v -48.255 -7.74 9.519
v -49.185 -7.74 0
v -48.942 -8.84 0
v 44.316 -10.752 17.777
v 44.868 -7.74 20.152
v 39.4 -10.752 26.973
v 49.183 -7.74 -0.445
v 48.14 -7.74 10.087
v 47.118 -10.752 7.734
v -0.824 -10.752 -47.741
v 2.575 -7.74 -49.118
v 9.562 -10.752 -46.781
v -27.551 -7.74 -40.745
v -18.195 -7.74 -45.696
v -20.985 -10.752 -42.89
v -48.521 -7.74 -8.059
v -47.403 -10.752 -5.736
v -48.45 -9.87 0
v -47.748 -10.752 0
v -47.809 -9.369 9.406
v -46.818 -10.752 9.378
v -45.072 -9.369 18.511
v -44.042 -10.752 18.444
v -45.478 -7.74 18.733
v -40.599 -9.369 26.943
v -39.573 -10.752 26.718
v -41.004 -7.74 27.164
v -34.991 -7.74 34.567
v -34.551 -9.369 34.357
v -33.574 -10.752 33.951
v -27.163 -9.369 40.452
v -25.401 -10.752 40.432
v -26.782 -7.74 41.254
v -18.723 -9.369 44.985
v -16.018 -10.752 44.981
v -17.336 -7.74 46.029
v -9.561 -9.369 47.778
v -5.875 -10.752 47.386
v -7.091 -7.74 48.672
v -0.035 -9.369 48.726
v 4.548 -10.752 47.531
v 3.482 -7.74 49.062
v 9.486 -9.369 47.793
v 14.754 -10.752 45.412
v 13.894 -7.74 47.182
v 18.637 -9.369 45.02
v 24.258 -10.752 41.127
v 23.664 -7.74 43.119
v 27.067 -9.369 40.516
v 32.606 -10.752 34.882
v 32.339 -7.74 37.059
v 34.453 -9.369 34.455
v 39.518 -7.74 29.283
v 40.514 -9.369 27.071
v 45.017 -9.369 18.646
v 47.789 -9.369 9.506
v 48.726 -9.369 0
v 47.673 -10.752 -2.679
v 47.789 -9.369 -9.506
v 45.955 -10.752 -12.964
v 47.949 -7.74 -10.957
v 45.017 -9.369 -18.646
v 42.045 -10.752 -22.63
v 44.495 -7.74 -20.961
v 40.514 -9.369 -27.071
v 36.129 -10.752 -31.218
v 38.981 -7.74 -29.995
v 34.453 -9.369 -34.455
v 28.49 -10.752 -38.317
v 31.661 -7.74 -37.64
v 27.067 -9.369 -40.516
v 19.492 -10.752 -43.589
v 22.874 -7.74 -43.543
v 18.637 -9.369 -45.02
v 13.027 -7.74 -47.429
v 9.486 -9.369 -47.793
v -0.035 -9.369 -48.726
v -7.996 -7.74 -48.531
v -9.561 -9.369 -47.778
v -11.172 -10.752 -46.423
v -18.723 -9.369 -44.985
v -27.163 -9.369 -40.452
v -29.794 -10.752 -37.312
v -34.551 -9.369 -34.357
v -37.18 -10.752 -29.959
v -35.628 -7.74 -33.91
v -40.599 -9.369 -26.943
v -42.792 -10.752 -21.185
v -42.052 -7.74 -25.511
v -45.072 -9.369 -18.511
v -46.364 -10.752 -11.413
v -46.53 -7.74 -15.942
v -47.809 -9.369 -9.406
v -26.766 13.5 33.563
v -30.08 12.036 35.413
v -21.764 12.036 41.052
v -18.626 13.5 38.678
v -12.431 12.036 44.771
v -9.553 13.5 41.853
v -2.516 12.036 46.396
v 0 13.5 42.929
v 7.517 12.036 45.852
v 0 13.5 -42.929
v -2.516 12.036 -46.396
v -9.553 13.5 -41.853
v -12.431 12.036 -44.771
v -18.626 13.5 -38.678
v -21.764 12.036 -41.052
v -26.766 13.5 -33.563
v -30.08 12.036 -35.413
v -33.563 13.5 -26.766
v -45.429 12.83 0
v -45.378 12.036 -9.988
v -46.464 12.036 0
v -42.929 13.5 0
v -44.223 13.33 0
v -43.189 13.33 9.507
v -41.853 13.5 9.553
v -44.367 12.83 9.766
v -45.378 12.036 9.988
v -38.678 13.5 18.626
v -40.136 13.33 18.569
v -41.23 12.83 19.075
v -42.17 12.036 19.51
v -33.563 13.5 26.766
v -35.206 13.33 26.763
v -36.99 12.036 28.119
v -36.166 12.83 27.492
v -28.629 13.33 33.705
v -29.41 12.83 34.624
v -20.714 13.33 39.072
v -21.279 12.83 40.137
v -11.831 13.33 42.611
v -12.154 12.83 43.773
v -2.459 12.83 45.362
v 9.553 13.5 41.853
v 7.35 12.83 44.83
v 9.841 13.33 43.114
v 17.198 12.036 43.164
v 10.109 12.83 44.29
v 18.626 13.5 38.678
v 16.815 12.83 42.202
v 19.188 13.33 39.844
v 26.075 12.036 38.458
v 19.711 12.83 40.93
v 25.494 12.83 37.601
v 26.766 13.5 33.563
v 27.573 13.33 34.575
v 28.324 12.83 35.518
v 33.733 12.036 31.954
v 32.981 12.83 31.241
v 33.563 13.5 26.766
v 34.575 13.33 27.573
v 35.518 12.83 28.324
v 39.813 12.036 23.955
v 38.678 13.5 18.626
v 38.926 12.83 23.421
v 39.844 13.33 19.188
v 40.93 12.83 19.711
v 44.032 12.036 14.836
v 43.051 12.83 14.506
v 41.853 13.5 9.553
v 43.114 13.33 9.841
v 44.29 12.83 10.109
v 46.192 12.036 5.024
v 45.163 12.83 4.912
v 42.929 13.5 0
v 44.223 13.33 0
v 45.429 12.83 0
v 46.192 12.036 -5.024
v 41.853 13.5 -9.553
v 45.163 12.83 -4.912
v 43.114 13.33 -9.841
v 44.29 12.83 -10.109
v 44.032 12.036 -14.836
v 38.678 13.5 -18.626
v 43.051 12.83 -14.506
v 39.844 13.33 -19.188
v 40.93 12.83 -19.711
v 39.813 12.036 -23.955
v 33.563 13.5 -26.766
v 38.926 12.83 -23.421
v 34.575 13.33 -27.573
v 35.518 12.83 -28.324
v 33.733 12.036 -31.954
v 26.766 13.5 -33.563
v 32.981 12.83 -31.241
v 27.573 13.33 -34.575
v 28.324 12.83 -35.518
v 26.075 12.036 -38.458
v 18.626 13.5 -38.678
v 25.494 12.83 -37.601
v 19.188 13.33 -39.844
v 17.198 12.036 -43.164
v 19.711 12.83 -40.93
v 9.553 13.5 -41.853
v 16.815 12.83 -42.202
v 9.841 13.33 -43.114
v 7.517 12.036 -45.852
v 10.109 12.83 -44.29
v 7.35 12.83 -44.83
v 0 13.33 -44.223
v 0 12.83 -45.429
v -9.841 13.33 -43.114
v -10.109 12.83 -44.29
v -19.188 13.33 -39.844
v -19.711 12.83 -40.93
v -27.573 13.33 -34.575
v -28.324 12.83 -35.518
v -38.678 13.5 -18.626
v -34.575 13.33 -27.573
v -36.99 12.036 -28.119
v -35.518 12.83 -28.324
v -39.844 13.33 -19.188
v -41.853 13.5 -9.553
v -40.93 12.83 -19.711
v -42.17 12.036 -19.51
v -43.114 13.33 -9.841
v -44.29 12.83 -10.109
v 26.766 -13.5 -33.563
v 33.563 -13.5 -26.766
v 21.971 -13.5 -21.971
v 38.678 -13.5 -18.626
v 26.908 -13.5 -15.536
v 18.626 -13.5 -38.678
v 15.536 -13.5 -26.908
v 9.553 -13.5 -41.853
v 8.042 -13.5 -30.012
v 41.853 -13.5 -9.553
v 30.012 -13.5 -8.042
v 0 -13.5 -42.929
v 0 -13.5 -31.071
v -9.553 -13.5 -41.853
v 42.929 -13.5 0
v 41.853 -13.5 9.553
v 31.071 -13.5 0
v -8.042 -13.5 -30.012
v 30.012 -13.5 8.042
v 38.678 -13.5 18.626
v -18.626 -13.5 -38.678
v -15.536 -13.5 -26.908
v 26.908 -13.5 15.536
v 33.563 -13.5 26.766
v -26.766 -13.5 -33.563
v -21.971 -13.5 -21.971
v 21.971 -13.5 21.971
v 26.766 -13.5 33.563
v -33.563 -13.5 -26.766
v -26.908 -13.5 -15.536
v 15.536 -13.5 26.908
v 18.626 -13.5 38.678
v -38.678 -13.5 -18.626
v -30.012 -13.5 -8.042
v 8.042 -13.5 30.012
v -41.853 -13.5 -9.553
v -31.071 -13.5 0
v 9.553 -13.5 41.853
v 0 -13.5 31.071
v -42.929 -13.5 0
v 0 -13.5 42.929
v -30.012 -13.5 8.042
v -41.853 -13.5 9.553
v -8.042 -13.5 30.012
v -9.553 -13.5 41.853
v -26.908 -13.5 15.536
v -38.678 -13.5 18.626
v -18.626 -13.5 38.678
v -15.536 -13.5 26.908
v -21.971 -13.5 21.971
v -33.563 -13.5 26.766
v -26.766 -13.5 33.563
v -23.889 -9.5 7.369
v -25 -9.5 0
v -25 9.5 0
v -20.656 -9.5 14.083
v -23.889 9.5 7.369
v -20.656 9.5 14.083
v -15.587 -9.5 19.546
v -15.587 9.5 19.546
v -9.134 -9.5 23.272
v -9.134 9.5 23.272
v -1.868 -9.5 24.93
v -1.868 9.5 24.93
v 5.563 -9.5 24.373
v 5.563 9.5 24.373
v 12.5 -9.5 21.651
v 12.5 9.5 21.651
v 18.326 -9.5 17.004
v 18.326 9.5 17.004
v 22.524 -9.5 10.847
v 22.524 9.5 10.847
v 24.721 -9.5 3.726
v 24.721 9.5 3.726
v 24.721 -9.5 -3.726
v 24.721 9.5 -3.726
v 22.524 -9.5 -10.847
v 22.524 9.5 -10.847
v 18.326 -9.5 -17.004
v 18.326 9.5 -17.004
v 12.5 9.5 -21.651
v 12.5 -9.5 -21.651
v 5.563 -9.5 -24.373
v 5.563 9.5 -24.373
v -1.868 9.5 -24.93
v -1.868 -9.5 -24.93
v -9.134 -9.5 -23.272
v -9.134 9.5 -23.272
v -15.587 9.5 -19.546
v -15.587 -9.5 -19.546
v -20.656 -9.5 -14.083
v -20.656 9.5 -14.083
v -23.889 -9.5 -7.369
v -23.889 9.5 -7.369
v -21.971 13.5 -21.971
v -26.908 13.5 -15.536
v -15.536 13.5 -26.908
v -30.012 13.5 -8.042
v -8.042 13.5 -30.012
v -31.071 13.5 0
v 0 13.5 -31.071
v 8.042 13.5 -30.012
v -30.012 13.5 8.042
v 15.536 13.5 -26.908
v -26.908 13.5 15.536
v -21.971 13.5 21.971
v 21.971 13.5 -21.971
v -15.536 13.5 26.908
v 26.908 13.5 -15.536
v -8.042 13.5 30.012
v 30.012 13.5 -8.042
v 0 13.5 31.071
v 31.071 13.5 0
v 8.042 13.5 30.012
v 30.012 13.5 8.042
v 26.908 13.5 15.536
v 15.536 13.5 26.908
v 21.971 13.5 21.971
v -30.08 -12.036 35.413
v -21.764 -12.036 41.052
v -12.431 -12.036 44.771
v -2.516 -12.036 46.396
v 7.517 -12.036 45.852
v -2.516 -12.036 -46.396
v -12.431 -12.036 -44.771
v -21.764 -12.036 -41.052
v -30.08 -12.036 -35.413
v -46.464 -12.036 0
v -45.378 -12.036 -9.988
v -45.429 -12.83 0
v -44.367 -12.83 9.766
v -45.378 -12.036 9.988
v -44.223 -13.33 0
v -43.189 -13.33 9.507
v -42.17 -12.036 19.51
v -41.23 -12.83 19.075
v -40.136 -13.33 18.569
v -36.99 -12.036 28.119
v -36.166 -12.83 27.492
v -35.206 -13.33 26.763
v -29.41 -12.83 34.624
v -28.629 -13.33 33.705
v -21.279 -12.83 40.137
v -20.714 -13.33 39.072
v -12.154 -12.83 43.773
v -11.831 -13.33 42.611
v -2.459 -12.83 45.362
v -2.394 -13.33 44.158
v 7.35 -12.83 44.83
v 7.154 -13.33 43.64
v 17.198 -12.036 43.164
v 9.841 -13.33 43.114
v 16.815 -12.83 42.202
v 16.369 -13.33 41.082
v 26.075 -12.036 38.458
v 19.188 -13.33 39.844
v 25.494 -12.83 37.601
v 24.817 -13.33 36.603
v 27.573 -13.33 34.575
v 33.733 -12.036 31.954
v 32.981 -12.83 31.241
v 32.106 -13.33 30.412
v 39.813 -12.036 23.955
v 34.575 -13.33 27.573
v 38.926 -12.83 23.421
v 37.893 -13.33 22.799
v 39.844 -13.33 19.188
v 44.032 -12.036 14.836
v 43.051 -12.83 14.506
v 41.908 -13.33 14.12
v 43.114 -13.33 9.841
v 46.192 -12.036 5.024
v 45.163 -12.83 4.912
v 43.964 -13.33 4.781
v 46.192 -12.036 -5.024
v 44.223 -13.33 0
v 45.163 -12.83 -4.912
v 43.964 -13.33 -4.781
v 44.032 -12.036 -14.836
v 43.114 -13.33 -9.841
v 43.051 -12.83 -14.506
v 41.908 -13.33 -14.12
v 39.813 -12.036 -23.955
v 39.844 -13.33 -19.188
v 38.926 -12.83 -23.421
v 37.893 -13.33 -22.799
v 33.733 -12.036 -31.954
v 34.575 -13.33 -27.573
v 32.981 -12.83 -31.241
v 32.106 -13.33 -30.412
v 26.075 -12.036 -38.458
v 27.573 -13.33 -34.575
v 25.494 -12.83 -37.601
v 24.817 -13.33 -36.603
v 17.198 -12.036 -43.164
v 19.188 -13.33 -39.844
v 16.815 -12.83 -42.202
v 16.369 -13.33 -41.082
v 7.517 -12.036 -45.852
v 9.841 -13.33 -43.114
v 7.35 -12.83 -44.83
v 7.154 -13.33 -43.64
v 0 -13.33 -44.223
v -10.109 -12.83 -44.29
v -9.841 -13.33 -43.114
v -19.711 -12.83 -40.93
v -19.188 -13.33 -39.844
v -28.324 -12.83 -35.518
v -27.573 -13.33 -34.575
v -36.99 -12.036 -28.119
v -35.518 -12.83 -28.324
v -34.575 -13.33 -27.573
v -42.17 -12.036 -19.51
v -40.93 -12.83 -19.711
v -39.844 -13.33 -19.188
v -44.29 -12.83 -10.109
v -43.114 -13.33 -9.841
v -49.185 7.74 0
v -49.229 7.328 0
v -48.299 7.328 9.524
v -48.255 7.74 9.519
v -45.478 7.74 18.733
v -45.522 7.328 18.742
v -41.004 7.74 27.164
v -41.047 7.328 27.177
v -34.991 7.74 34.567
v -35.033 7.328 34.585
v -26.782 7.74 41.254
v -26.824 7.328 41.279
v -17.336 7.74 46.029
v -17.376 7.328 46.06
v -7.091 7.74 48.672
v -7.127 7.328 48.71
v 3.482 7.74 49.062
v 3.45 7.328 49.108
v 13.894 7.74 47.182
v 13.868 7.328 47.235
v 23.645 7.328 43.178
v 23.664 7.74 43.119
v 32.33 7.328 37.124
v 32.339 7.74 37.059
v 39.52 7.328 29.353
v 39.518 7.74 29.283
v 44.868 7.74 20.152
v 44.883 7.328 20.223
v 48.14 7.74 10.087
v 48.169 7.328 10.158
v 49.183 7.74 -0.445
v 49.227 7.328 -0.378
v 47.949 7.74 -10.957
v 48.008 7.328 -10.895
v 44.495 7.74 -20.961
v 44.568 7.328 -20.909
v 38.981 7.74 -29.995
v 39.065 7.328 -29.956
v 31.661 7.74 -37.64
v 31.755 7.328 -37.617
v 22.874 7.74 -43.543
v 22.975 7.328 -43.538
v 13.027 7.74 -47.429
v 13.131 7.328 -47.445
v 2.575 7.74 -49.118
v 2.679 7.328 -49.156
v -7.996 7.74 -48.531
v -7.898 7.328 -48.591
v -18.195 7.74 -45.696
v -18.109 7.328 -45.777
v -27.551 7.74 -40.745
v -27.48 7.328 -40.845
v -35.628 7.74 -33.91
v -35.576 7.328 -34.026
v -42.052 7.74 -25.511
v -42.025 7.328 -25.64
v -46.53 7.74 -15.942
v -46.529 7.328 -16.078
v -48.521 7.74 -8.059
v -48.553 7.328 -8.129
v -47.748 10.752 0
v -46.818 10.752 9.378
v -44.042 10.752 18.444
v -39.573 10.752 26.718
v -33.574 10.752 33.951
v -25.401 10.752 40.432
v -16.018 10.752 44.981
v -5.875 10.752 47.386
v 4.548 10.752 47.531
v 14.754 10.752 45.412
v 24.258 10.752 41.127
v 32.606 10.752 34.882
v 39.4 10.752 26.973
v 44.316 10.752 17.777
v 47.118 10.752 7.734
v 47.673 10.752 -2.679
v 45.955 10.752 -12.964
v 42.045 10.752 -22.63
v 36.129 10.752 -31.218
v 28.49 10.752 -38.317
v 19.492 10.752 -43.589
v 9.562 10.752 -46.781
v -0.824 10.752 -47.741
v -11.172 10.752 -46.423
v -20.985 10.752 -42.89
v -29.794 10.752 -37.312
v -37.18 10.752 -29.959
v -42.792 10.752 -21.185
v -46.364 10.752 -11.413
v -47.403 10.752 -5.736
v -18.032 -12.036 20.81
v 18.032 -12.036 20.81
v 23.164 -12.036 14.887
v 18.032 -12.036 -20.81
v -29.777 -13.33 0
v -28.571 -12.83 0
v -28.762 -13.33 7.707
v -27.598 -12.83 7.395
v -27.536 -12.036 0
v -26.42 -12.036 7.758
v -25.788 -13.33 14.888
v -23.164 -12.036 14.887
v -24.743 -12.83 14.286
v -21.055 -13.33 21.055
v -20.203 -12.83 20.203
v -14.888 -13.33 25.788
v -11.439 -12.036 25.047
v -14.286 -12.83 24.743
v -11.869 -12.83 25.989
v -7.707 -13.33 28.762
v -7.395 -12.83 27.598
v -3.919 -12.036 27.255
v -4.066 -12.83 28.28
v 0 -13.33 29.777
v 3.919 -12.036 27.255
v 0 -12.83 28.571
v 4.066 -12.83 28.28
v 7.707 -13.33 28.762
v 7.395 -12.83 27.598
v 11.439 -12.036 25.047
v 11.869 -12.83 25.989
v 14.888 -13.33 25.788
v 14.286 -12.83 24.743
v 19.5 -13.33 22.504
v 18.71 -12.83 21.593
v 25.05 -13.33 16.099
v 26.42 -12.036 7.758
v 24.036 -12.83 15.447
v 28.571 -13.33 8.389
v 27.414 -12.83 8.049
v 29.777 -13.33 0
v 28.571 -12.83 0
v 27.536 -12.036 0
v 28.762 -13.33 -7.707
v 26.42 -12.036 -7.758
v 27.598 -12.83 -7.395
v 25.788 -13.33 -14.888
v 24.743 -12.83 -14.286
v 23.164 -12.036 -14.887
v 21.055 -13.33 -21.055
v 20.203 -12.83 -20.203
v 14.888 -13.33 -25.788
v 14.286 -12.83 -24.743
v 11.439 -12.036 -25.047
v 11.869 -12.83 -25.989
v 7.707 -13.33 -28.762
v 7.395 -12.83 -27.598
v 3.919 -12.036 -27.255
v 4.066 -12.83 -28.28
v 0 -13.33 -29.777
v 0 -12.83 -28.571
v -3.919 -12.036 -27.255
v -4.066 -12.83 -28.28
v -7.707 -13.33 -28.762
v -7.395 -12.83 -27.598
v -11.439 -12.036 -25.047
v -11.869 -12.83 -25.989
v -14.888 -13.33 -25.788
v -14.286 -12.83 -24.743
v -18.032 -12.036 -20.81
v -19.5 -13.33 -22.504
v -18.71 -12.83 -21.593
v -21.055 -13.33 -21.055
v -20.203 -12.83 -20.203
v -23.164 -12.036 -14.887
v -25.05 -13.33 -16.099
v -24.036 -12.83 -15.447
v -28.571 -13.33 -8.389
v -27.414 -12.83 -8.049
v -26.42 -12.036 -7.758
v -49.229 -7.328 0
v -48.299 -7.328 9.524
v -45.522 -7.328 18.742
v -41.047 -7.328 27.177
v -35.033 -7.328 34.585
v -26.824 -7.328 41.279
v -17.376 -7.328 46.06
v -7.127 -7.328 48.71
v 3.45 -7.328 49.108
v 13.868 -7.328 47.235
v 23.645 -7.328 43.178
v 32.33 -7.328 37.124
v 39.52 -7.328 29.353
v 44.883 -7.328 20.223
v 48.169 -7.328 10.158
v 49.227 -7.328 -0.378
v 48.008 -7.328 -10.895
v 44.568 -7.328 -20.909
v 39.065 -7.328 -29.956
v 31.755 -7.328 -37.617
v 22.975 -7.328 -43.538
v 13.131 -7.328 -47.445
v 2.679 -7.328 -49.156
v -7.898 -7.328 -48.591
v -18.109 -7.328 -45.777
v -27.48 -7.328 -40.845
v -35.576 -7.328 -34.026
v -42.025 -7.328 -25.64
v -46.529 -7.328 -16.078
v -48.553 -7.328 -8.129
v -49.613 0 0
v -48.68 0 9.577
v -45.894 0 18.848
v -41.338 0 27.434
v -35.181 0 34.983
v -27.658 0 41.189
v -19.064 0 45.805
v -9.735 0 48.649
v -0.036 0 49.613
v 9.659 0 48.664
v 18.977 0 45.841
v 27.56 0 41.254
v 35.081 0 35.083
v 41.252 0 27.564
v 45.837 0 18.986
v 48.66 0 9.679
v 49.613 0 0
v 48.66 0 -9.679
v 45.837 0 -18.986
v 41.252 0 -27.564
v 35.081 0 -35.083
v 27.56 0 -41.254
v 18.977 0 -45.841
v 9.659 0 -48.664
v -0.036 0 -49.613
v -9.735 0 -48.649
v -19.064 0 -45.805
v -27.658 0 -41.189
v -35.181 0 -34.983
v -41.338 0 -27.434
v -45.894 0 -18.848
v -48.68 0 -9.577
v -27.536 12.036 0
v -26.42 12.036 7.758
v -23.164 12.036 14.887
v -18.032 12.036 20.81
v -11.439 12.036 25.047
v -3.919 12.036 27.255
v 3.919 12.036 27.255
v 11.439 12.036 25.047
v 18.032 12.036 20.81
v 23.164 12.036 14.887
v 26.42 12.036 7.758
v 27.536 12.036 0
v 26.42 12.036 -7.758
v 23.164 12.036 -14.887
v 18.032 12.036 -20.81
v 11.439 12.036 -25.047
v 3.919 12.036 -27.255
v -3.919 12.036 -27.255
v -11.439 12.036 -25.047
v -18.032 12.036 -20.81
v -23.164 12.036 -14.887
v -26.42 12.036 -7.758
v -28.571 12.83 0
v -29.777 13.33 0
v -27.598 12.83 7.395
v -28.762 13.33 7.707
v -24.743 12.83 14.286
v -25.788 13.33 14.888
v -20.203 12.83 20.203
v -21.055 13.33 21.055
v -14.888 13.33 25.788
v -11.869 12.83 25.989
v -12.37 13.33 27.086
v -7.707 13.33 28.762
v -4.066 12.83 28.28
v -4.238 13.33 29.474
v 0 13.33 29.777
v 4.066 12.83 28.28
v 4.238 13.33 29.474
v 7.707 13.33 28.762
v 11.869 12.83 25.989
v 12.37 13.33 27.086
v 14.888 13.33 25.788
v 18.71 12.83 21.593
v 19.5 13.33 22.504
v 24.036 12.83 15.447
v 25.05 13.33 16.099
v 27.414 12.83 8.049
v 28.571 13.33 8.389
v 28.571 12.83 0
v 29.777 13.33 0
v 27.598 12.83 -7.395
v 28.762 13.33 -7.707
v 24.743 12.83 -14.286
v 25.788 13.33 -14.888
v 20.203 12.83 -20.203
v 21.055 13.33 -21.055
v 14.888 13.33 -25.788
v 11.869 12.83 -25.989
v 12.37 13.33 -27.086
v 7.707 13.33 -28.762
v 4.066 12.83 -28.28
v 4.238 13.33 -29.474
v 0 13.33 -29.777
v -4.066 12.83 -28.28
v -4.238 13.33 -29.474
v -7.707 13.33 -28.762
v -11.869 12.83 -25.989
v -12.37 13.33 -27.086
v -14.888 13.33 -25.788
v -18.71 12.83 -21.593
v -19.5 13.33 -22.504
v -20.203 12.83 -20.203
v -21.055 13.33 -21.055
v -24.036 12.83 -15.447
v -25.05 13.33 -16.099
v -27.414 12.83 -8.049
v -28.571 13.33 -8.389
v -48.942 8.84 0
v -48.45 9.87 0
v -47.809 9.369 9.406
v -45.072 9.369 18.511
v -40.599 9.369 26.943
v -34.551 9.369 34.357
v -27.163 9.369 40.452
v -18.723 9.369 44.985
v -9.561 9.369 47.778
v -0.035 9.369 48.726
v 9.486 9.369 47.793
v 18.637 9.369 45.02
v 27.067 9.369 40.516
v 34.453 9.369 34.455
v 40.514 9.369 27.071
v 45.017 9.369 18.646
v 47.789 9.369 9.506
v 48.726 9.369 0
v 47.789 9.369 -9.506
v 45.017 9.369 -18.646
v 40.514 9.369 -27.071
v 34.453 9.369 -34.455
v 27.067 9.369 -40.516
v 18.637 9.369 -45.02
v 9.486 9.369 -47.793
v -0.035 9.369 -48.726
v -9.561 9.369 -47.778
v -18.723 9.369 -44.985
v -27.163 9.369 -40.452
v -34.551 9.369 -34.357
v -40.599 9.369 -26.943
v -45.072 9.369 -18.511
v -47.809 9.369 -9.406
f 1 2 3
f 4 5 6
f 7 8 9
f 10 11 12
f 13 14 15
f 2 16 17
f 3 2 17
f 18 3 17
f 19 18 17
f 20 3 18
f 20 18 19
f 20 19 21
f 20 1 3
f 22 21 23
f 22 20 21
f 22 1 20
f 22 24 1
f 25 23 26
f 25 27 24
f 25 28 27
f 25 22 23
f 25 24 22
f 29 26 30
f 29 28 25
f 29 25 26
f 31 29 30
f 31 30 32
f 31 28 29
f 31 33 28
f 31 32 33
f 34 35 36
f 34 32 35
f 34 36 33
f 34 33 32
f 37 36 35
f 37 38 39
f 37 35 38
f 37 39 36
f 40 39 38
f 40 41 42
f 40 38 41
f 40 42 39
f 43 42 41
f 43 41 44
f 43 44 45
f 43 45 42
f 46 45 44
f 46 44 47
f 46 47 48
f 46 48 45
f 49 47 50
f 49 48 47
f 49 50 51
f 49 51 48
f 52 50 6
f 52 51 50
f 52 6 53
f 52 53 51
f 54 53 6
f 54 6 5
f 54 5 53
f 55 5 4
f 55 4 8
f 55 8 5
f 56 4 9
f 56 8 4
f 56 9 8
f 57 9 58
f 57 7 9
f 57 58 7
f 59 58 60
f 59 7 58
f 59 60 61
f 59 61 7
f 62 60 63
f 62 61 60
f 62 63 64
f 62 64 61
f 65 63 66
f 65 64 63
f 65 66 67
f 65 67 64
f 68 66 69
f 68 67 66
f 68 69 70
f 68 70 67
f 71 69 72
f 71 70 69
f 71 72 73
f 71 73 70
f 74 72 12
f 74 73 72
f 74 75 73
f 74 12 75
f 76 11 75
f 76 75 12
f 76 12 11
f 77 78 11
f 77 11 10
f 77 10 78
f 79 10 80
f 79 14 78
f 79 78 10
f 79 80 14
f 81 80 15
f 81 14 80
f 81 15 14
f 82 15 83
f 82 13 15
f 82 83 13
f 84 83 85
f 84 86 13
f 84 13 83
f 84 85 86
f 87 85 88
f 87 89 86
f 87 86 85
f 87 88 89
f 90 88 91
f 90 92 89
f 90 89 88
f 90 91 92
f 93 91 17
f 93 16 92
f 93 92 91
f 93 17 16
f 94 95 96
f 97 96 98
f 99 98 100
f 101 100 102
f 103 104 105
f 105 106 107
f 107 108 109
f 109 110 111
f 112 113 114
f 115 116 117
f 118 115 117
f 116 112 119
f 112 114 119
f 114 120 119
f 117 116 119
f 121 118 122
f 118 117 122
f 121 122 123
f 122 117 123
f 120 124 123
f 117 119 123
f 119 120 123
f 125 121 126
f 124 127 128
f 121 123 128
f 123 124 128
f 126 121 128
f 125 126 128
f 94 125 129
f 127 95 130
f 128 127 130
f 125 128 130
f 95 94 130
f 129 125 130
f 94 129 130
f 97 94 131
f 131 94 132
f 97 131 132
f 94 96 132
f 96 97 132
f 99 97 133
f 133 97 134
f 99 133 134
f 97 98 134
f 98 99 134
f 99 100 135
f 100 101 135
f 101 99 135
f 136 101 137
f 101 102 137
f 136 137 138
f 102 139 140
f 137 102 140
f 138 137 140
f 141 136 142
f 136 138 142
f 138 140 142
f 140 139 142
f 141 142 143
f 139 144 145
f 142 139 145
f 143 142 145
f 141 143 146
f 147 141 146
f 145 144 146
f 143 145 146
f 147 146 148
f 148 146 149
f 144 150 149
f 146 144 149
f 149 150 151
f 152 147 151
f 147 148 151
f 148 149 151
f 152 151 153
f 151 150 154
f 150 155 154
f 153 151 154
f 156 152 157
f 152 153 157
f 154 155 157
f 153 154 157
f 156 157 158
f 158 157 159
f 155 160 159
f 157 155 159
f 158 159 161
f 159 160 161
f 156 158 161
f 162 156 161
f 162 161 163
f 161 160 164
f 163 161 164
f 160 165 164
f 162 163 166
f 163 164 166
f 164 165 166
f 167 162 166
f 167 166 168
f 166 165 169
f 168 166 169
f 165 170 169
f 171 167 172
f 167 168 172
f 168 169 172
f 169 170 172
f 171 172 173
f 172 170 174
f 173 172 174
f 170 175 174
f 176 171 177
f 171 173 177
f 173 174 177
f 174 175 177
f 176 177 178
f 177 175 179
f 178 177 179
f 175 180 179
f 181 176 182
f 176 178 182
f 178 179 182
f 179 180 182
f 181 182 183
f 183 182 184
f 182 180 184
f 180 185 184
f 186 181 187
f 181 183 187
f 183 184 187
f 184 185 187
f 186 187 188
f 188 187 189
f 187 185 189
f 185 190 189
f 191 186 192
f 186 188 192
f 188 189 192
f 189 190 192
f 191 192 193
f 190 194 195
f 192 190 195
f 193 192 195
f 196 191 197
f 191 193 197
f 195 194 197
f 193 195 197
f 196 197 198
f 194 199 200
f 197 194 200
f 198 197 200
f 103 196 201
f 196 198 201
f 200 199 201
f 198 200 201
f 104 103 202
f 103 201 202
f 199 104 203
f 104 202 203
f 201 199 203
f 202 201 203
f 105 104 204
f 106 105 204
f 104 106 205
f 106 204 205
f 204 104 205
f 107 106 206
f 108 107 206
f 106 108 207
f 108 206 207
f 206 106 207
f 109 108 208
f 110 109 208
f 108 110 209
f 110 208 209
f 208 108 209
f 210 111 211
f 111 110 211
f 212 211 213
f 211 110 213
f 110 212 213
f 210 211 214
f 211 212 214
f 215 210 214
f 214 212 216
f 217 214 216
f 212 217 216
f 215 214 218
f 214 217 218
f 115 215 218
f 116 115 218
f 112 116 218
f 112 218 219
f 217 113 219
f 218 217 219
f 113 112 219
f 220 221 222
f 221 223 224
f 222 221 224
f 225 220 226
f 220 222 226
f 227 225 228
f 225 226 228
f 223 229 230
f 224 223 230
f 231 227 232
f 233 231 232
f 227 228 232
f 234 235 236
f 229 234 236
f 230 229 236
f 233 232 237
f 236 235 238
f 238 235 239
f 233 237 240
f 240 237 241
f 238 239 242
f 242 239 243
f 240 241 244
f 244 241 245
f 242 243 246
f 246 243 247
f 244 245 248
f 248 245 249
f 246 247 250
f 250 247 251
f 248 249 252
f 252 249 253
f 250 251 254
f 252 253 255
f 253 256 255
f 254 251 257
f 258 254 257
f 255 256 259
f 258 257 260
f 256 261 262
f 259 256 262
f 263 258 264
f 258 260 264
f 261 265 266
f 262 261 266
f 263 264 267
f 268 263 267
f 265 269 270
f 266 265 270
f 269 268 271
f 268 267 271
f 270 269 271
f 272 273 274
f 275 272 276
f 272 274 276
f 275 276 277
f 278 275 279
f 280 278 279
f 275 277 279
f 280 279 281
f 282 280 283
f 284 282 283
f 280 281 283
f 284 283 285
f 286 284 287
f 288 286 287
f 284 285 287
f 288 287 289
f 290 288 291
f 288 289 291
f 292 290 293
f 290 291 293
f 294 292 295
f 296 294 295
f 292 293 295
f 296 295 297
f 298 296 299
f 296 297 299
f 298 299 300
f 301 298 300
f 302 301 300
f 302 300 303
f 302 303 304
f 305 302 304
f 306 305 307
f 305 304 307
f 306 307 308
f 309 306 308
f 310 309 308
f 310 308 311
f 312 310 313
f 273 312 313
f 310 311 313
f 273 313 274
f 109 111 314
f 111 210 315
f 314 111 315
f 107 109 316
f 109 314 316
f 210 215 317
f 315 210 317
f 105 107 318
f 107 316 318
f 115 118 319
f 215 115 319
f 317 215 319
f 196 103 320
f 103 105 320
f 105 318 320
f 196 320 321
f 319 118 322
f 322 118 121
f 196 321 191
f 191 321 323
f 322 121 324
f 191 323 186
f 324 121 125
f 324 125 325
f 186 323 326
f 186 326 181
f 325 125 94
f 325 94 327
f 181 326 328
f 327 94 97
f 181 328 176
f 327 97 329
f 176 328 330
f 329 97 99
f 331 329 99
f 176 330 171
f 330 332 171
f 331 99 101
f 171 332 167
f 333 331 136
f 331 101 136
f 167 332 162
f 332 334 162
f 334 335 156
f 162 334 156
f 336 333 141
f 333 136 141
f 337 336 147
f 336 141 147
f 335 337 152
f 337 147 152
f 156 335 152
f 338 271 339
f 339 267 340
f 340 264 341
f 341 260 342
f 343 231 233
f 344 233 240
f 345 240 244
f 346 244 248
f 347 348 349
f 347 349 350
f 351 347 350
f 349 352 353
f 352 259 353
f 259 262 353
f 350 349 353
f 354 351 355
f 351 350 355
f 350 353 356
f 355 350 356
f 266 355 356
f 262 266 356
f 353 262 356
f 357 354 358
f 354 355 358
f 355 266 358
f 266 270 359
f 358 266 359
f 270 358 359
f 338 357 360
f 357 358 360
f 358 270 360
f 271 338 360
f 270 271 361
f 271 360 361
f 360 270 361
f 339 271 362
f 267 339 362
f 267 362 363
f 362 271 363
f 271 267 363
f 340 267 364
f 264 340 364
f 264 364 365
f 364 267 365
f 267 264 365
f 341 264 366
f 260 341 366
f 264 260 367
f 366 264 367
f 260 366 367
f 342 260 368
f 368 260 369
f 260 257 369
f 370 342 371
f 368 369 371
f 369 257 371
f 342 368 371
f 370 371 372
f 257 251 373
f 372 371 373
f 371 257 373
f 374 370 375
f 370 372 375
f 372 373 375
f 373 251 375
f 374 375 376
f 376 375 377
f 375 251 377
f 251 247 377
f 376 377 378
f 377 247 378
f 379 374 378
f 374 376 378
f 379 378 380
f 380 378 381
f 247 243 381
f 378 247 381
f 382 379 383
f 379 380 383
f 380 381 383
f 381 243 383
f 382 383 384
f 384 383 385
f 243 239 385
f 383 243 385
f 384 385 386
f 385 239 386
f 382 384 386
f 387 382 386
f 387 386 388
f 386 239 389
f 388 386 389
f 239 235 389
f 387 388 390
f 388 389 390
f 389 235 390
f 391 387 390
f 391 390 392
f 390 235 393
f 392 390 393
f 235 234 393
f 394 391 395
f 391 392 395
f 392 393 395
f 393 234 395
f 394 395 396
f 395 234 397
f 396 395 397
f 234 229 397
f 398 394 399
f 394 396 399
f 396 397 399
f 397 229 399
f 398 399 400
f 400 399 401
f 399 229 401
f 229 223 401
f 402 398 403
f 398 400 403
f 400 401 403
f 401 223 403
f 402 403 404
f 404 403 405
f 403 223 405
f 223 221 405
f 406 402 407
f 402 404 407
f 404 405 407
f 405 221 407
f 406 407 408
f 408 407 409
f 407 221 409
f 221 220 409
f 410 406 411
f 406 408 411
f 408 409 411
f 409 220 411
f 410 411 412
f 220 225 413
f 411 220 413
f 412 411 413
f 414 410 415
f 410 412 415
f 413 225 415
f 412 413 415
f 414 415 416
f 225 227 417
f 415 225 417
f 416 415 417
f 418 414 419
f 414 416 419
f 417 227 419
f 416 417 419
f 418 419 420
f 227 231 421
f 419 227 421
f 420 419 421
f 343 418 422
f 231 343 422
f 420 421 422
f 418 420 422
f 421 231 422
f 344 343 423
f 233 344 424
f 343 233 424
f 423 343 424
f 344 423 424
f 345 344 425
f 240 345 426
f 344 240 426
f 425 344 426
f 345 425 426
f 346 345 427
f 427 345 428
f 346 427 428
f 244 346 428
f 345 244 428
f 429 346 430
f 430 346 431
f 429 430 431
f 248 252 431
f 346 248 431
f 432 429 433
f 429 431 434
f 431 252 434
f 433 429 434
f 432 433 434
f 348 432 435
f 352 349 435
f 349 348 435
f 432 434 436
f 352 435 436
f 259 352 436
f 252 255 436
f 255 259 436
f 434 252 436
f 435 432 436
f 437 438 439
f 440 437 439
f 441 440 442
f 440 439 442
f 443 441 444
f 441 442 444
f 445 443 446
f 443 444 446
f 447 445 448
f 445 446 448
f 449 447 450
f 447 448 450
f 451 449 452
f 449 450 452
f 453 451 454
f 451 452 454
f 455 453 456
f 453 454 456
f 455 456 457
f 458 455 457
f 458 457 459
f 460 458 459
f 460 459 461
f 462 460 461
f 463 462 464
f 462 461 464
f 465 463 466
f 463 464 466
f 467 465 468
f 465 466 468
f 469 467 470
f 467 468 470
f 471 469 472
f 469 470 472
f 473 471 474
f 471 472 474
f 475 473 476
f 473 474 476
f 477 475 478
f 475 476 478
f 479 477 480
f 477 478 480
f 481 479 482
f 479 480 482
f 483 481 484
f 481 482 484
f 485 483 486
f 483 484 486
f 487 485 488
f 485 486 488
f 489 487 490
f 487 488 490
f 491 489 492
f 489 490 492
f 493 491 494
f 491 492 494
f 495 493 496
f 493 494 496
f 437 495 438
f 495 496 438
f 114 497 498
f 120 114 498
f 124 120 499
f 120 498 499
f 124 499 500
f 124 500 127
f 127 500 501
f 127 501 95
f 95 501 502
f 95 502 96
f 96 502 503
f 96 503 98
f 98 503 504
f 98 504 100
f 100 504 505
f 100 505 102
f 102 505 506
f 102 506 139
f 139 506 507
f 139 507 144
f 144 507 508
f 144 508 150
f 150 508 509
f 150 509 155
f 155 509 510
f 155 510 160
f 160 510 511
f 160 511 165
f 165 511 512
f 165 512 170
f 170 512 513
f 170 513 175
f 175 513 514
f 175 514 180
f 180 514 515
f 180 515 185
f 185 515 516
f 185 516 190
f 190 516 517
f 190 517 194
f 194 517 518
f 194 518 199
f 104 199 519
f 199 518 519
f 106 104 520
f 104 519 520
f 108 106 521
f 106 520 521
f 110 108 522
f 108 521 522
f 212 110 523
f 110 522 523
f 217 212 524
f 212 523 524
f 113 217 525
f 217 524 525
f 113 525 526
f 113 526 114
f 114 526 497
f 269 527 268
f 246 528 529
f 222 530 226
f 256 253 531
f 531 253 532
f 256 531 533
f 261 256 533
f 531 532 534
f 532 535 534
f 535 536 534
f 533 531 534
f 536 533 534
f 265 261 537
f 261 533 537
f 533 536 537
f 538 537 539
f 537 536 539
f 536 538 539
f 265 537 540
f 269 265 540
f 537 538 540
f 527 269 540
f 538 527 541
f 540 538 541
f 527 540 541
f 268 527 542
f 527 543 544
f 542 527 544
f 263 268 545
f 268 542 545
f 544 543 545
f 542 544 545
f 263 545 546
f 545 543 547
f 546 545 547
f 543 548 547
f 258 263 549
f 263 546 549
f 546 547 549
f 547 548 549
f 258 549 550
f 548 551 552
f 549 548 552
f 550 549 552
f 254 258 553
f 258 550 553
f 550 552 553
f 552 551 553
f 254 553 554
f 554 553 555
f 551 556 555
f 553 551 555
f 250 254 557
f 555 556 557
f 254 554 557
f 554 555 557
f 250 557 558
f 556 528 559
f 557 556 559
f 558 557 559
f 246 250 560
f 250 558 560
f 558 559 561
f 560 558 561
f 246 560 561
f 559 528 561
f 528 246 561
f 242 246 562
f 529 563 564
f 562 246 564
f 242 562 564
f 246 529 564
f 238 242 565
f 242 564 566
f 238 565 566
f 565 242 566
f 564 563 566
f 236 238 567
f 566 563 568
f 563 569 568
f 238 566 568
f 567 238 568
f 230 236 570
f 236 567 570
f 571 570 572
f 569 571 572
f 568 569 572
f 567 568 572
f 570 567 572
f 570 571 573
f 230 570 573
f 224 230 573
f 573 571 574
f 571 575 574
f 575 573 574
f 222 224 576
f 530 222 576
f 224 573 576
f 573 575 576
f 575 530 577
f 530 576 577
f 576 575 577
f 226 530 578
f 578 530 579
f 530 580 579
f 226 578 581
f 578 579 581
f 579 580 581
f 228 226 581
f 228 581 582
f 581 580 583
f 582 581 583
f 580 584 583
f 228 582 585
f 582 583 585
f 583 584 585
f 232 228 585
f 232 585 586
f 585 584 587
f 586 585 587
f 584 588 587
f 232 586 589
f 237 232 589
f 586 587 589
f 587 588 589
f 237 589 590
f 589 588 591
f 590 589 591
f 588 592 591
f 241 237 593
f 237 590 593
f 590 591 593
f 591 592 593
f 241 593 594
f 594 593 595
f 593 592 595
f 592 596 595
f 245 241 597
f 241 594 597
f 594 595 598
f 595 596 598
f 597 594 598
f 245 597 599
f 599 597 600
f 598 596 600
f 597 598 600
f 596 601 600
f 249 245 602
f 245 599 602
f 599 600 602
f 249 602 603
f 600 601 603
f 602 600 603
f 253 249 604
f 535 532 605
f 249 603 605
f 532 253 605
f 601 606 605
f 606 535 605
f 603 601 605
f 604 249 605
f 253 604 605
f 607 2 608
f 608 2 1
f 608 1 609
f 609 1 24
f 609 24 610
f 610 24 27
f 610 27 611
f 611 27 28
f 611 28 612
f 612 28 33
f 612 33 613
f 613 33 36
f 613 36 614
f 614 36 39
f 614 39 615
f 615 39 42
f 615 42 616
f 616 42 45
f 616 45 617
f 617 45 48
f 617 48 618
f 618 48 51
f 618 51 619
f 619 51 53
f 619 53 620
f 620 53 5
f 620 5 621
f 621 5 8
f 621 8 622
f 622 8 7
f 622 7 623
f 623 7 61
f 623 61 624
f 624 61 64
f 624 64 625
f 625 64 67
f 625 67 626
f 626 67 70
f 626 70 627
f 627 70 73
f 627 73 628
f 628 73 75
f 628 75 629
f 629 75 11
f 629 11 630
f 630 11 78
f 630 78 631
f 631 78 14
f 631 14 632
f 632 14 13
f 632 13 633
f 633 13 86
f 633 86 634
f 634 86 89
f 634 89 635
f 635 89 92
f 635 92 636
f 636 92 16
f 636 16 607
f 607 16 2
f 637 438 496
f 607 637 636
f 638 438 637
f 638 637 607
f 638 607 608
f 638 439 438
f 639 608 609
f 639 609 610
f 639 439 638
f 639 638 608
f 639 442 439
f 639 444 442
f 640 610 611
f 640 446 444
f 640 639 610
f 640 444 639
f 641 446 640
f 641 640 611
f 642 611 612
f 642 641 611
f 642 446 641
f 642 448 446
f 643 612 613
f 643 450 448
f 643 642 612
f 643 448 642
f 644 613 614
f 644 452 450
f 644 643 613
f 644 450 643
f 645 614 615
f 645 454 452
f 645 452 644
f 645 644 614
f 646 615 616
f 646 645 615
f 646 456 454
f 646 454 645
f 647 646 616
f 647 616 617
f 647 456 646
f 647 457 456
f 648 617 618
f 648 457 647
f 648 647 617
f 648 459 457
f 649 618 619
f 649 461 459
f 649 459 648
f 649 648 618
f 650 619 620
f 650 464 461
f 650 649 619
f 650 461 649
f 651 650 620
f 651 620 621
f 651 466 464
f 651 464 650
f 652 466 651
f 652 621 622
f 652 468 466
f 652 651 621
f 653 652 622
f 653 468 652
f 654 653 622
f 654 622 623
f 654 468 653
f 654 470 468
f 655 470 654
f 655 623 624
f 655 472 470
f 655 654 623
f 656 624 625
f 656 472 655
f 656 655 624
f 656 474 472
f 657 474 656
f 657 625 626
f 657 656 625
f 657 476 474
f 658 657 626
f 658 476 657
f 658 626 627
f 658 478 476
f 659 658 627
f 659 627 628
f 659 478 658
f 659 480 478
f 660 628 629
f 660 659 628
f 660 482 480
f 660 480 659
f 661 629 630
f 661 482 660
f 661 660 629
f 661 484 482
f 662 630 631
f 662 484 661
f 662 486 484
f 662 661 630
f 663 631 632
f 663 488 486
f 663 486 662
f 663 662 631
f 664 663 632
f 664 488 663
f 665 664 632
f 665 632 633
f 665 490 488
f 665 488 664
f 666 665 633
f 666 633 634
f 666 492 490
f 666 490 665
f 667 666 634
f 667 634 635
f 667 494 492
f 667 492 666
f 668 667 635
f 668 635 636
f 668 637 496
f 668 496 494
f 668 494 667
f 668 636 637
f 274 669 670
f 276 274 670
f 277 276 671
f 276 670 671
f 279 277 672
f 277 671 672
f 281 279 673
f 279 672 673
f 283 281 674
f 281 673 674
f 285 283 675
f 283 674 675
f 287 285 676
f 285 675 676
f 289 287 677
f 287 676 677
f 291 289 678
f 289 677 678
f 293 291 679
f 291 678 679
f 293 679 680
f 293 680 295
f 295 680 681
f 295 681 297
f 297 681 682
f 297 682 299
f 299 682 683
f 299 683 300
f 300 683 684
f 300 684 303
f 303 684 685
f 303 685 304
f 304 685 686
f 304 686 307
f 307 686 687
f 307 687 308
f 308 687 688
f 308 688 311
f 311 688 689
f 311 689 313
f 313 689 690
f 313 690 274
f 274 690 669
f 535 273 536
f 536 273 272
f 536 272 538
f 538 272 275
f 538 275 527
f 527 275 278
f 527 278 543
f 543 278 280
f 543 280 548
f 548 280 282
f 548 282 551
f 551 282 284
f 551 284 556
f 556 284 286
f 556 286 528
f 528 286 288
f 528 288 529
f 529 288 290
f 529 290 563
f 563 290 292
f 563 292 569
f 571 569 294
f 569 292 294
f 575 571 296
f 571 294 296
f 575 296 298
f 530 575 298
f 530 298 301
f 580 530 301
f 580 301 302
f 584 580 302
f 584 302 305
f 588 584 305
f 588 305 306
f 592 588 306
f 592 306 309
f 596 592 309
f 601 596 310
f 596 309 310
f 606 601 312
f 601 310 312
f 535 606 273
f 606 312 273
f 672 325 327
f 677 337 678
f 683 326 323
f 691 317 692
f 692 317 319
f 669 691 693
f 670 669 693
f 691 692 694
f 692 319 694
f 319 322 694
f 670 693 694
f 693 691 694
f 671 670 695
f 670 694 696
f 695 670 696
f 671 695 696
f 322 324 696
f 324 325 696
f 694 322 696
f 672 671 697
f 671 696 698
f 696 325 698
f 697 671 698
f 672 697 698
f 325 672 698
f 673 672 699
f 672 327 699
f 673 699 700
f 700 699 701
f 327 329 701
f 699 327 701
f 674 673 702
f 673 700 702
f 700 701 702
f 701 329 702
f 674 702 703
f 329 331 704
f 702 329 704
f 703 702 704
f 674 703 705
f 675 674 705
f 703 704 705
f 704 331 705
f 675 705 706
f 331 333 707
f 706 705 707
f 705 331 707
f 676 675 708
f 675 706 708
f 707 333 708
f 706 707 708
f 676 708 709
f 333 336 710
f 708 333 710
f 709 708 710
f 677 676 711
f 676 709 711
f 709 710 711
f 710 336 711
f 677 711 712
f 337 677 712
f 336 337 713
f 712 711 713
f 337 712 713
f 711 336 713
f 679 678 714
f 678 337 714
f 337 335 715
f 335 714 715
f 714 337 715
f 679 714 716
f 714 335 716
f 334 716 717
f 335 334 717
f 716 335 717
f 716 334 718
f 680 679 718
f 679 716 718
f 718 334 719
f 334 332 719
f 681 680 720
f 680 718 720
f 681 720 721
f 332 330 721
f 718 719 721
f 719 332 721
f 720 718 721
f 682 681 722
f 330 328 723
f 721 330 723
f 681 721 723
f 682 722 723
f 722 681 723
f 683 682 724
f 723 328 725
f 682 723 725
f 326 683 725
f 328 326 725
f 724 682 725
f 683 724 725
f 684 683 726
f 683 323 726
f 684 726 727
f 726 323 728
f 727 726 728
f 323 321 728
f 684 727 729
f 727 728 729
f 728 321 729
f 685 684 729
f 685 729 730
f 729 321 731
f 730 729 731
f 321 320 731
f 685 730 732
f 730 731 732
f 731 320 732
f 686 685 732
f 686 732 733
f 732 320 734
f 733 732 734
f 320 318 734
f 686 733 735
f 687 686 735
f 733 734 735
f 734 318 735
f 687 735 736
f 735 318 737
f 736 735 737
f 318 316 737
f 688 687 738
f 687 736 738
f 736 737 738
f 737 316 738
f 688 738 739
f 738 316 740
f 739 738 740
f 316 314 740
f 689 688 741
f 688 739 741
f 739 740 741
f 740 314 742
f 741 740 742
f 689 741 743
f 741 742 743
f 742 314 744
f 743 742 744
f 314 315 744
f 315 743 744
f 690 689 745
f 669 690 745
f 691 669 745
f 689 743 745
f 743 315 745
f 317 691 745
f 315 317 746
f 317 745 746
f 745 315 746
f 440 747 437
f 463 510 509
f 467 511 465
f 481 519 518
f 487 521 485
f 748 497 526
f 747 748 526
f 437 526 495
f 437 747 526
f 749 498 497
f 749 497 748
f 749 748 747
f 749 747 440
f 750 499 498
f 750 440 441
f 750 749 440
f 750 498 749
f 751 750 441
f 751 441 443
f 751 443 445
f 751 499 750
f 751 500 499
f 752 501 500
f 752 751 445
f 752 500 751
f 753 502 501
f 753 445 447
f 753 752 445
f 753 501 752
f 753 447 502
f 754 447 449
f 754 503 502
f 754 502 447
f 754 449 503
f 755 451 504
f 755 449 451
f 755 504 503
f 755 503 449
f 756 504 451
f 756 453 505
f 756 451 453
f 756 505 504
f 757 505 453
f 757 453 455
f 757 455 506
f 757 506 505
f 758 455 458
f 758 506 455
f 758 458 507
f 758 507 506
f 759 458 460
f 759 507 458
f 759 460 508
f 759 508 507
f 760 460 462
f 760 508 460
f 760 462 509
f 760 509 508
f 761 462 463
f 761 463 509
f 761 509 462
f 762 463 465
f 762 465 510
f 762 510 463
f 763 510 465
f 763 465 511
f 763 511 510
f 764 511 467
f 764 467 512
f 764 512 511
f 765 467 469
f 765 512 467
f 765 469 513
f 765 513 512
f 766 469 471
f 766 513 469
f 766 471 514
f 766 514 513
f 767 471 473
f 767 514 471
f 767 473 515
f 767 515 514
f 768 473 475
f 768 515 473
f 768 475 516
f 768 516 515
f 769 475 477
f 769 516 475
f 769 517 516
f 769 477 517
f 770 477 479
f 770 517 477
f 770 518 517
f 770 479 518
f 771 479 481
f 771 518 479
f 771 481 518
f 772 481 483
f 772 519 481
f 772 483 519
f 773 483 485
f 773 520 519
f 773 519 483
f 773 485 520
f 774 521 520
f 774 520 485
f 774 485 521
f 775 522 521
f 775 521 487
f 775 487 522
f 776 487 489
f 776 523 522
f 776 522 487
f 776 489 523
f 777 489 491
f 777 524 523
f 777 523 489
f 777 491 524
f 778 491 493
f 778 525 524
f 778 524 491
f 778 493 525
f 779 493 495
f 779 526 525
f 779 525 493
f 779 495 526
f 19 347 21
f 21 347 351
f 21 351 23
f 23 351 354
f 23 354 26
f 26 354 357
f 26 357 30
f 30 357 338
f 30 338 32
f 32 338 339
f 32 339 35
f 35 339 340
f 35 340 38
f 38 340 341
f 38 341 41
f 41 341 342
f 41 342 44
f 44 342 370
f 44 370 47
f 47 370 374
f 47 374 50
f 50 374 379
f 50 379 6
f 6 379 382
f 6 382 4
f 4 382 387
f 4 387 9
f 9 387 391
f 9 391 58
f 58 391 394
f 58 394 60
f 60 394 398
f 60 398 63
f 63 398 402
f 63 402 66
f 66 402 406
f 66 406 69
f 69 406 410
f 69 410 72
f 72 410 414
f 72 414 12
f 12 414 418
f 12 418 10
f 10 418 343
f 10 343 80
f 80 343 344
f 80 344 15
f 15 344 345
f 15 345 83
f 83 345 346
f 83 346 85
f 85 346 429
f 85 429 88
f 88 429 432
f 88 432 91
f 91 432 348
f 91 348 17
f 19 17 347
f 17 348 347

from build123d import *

# Parameters (mm, degrees)
F2_R = 5
F3_R = 70


with BuildPart() as f1:
    # F0 (on Top) → F1 (revolve)
    with BuildSketch(Plane.XY):
        Polygon((-25, 0), (-25, 9.5), (-29, 13.5), (-45, 13.5), (-49, 9.5), (-50, 0), (-49, -9.5), (-45, -13.5), (-29, -13.5), (-25, -9.5), align=None)
        Polygon((-25, 0), (-25, 9.5), (-29, 13.5), (-45, 13.5), (-49, 9.5), (-50, 0), (-49, -9.5), (-45, -13.5), (-29, -13.5), (-25, -9.5), align=None)
    revolve(axis=Axis((0, 18.855867, 0), (0, 1, 0)))

    # F2
    f2_edges = [f1.edges().sort_by_distance(p)[0] for p in [
        (29, -13.5, 0),
        (45, -13.5, 0),
        (49, -9.5, 0),
        (45, 13.5, 0),
        (29, 13.5, 0),
        (49, 9.5, 0),
    ]]
    fillet(f2_edges, radius=F2_R)

    # F3
    f3_edges = [f1.edges().sort_by_distance(p)[0] for p in [
        (50, 0, 0),
    ]]
    fillet(f3_edges, radius=F3_R)


solid = f1.part
